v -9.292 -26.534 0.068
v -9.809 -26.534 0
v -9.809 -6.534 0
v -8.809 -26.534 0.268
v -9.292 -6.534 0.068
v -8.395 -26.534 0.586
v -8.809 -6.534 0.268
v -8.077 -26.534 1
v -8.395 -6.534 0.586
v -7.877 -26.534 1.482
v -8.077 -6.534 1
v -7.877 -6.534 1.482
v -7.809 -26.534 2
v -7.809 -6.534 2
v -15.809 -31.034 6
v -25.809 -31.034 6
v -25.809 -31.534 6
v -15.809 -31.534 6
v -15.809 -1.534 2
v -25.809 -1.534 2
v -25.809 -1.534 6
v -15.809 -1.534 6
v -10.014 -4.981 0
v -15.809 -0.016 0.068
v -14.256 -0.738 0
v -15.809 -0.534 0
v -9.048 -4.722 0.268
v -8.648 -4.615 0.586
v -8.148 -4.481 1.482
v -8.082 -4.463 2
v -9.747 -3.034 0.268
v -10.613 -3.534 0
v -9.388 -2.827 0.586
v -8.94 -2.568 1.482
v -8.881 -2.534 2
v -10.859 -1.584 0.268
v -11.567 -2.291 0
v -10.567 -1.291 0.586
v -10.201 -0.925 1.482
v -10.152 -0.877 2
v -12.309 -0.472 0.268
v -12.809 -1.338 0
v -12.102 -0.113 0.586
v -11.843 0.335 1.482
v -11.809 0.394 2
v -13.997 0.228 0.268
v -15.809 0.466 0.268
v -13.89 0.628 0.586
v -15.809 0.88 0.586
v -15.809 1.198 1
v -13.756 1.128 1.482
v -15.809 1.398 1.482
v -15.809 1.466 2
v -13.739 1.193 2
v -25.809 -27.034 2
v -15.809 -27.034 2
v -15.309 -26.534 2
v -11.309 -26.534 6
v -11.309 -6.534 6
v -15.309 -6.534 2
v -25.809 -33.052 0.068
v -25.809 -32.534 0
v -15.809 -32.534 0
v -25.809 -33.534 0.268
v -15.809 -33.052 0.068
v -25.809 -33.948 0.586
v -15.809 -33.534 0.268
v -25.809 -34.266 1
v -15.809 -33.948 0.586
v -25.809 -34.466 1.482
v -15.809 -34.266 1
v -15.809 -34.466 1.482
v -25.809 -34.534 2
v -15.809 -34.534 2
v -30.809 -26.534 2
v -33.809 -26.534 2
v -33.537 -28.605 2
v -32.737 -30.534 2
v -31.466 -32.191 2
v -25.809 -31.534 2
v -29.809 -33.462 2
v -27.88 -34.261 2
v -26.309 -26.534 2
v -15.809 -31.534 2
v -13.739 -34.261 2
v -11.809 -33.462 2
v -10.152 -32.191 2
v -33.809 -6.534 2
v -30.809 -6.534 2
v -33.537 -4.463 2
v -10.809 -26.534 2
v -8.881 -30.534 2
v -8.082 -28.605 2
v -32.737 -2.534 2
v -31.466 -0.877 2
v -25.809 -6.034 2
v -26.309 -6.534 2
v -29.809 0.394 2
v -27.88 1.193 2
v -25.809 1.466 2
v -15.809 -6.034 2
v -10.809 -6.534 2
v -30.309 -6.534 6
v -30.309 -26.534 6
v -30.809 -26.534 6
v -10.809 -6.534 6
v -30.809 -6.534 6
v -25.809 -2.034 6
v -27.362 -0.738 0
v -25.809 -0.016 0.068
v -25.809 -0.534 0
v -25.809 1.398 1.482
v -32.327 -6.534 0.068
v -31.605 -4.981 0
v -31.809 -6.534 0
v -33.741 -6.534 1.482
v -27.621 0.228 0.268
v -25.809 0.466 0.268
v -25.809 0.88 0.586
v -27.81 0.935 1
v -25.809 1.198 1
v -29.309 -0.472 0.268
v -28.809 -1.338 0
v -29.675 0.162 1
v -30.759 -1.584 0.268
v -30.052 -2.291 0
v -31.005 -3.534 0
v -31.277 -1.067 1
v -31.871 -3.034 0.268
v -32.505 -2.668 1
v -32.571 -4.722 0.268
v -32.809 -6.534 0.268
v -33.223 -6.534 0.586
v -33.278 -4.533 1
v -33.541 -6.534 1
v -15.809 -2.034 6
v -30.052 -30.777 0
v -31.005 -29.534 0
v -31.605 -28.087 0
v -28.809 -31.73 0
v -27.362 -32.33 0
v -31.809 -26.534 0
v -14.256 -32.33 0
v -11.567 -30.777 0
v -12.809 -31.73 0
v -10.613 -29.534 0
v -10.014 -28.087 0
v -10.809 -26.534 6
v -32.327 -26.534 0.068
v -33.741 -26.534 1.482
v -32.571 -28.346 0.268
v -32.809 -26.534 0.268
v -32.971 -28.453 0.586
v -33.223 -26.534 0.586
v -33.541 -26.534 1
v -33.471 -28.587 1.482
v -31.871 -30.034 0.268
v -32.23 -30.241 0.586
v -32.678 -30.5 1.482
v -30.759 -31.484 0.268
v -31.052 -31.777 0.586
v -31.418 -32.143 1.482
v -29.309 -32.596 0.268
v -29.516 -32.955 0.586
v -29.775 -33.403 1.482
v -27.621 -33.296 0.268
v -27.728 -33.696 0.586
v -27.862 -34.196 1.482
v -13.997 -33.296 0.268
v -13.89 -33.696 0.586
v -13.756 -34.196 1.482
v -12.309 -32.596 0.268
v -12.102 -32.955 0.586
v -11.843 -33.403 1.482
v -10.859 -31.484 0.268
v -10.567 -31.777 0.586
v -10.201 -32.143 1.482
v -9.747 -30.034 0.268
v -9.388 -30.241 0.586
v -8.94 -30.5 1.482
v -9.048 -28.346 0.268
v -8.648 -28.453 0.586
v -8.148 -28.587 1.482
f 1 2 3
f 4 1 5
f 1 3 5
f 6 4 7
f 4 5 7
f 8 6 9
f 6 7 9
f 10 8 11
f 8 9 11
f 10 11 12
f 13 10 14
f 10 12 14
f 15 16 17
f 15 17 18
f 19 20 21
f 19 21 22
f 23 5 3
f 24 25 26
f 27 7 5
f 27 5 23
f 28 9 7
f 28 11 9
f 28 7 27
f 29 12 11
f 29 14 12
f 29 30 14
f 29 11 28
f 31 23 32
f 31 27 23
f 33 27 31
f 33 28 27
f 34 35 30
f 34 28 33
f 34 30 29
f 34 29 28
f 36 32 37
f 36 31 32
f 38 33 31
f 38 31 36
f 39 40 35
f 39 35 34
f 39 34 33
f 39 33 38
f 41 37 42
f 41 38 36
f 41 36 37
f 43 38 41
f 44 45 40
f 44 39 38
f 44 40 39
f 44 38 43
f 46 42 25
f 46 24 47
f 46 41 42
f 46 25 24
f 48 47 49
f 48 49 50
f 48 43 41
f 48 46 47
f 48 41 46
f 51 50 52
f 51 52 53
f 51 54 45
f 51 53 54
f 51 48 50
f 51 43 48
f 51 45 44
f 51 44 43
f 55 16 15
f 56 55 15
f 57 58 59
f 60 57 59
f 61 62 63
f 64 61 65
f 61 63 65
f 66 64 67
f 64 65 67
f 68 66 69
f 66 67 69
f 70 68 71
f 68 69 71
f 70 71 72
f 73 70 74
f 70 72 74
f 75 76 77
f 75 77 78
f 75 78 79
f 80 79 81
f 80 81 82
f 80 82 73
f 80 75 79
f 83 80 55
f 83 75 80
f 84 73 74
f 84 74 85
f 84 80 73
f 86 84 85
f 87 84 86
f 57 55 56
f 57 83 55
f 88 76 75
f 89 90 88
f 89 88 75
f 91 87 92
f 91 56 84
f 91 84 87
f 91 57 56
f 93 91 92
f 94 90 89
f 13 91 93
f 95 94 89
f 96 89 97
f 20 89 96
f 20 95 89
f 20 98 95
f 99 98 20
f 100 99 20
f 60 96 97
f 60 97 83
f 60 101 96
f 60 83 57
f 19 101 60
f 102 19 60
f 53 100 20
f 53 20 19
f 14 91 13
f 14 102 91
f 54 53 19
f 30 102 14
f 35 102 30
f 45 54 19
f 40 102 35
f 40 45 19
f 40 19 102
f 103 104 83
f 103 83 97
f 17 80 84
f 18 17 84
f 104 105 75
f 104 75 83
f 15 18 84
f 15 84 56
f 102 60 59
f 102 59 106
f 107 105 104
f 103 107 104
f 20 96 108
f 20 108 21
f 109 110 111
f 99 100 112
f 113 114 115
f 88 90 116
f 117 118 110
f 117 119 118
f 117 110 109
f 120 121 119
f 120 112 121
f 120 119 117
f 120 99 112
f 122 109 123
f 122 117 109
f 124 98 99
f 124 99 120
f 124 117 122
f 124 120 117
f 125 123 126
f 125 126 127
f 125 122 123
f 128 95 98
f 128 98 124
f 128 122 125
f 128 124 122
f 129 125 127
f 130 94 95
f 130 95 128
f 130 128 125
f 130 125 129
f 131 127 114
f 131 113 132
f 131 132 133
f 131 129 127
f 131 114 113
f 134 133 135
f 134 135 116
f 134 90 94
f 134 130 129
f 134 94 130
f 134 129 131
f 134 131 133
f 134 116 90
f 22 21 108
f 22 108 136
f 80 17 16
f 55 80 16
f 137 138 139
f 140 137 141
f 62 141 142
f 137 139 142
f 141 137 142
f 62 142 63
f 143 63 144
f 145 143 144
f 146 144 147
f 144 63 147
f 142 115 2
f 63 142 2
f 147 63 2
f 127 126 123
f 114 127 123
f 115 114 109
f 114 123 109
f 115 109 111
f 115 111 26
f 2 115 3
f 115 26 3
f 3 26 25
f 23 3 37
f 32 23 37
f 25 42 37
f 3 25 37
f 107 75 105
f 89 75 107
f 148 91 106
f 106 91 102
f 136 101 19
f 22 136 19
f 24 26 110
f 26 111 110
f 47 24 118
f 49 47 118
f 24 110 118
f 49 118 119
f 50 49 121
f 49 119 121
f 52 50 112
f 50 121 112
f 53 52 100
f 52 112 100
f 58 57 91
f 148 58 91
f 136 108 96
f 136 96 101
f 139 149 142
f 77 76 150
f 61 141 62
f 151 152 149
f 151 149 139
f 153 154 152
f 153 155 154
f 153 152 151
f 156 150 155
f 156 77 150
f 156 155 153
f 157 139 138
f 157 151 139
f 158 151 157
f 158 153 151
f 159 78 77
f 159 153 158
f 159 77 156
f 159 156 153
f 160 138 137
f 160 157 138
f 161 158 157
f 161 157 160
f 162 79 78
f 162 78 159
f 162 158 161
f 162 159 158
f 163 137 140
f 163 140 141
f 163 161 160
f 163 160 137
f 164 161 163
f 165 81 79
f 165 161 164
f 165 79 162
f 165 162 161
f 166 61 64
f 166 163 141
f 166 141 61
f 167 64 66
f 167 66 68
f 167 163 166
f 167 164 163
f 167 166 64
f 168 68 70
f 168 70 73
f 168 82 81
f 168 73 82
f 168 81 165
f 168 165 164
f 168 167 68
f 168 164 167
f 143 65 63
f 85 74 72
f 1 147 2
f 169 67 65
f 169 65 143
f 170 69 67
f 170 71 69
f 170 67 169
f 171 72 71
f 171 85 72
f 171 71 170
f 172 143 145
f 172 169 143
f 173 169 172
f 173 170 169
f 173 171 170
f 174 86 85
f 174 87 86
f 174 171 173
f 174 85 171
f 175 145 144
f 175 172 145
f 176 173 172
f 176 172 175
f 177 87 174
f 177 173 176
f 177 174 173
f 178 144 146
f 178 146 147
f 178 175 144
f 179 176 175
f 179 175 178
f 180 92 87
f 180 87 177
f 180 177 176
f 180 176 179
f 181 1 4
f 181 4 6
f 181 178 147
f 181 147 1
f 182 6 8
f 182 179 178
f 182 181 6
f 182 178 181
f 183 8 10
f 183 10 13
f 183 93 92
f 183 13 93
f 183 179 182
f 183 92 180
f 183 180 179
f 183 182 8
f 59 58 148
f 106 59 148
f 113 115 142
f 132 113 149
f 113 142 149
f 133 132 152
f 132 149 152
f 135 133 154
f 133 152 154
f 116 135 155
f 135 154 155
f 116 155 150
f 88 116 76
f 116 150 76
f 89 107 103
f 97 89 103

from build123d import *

# Parameters (mm, degrees)
EXTRUDE_1_DEPTH = 2
SKETCH_2_W      = 0.5
SKETCH_2_H      = 20
SKETCH_2_W_2    = 10
SKETCH_2_H_2    = 0.5
EXTRUDE_2_DEPTH = 4
CHAMFER_1_SIZE  = 4
FILLET_1_R      = 2


with BuildPart() as part:
    # Эскиз1 → Бобышка-Вытянуть1 (new body)
    with BuildSketch(Plane.XY):
        with BuildLine():
            Line((-25.809245543, -34.533993398), (-22.574730597, -34.533993398))
            Line((-22.574730597, -34.533993398), (-19.086915297, -34.533993398))
            Line((-19.086915297, -34.533993398), (-15.809245543, -34.533993398))
            ThreePointArc((-15.809245543, -34.533993398), (-10.152391293, -32.190847647), (-7.809245543, -26.533993398))
            Line((-7.809245543, -26.533993398), (-7.809245543, -18.565345077))
            Line((-7.809245543, -18.565345077), (-7.809245543, -14.503170045))
            Line((-7.809245543, -14.503170045), (-7.809245543, -6.533993398))
            ThreePointArc((-7.809245543, -6.533993398), (-10.152391293, -0.877139148), (-15.809245543, 1.466006602))
            Line((-15.809245543, 1.466006602), (-19.086915297, 1.466006602))
            Line((-19.086915297, 1.466006602), (-22.574730597, 1.466006602))
            Line((-22.574730597, 1.466006602), (-25.809245543, 1.466006602))
            ThreePointArc((-25.809245543, 1.466006602), (-31.466099792, -0.877139148), (-33.809245543, -6.533993398))
            Line((-33.809245543, -6.533993398), (-33.809245543, -14.503170045))
            Line((-33.809245543, -14.503170045), (-33.809245543, -18.565345077))
            Line((-33.809245543, -18.565345077), (-33.809245543, -26.533993398))
            ThreePointArc((-33.809245543, -26.533993398), (-31.466099792, -32.190847647), (-25.809245543, -34.533993398))
        make_face()
    extrude(amount=EXTRUDE_1_DEPTH)

    # Эскиз2 → Бобышка-Вытянуть2 (add)
    with BuildSketch(Plane.XY.offset(2)):
        with Locations((-30.559245543, -16.533993398)):
            Rectangle(SKETCH_2_W, SKETCH_2_H)
        with Locations((-20.809245543, -31.283993398)):
            Rectangle(SKETCH_2_W_2, SKETCH_2_H_2)
        with Locations((-11.059245543, -16.533993398)):
            Rectangle(SKETCH_2_W, SKETCH_2_H)
        with Locations((-20.809245543, -1.783993398)):
            Rectangle(SKETCH_2_W_2, SKETCH_2_H_2)
    extrude(amount=EXTRUDE_2_DEPTH)

    # Фаска1
    chamfer_1_edges = [part.edges().sort_by_distance(p)[0] for p in [
        (-20.809245543, -31.033993398, 2),
        (-30.309245543, -16.533993398, 2),
        (-20.809245543, -2.033993398, 2),
        (-11.309245543, -16.533993398, 2),
    ]]
    chamfer(chamfer_1_edges, length=CHAMFER_1_SIZE - 0.0001)  # a hair under: the kernel refuses the full size

    # Скругление1
    fillet_1_edges = [part.edges().sort_by_distance(p)[0] for p in [
        (-31.466099792, -0.877139148, 0),
        (-20.809245543, 1.466006602, 0),
        (-10.152391293, -0.877139148, 0),
        (-7.809245543, -16.533993398, 0),
        (-10.152391293, -32.190847647, 0),
        (-20.809245543, -34.533993398, 0),
        (-31.466099792, -32.190847647, 0),
        (-33.809245543, -16.533993398, 0),
    ]]
    fillet(fillet_1_edges, radius=FILLET_1_R - 0.0001)  # a hair under: the kernel refuses the full size


solid = part.part
